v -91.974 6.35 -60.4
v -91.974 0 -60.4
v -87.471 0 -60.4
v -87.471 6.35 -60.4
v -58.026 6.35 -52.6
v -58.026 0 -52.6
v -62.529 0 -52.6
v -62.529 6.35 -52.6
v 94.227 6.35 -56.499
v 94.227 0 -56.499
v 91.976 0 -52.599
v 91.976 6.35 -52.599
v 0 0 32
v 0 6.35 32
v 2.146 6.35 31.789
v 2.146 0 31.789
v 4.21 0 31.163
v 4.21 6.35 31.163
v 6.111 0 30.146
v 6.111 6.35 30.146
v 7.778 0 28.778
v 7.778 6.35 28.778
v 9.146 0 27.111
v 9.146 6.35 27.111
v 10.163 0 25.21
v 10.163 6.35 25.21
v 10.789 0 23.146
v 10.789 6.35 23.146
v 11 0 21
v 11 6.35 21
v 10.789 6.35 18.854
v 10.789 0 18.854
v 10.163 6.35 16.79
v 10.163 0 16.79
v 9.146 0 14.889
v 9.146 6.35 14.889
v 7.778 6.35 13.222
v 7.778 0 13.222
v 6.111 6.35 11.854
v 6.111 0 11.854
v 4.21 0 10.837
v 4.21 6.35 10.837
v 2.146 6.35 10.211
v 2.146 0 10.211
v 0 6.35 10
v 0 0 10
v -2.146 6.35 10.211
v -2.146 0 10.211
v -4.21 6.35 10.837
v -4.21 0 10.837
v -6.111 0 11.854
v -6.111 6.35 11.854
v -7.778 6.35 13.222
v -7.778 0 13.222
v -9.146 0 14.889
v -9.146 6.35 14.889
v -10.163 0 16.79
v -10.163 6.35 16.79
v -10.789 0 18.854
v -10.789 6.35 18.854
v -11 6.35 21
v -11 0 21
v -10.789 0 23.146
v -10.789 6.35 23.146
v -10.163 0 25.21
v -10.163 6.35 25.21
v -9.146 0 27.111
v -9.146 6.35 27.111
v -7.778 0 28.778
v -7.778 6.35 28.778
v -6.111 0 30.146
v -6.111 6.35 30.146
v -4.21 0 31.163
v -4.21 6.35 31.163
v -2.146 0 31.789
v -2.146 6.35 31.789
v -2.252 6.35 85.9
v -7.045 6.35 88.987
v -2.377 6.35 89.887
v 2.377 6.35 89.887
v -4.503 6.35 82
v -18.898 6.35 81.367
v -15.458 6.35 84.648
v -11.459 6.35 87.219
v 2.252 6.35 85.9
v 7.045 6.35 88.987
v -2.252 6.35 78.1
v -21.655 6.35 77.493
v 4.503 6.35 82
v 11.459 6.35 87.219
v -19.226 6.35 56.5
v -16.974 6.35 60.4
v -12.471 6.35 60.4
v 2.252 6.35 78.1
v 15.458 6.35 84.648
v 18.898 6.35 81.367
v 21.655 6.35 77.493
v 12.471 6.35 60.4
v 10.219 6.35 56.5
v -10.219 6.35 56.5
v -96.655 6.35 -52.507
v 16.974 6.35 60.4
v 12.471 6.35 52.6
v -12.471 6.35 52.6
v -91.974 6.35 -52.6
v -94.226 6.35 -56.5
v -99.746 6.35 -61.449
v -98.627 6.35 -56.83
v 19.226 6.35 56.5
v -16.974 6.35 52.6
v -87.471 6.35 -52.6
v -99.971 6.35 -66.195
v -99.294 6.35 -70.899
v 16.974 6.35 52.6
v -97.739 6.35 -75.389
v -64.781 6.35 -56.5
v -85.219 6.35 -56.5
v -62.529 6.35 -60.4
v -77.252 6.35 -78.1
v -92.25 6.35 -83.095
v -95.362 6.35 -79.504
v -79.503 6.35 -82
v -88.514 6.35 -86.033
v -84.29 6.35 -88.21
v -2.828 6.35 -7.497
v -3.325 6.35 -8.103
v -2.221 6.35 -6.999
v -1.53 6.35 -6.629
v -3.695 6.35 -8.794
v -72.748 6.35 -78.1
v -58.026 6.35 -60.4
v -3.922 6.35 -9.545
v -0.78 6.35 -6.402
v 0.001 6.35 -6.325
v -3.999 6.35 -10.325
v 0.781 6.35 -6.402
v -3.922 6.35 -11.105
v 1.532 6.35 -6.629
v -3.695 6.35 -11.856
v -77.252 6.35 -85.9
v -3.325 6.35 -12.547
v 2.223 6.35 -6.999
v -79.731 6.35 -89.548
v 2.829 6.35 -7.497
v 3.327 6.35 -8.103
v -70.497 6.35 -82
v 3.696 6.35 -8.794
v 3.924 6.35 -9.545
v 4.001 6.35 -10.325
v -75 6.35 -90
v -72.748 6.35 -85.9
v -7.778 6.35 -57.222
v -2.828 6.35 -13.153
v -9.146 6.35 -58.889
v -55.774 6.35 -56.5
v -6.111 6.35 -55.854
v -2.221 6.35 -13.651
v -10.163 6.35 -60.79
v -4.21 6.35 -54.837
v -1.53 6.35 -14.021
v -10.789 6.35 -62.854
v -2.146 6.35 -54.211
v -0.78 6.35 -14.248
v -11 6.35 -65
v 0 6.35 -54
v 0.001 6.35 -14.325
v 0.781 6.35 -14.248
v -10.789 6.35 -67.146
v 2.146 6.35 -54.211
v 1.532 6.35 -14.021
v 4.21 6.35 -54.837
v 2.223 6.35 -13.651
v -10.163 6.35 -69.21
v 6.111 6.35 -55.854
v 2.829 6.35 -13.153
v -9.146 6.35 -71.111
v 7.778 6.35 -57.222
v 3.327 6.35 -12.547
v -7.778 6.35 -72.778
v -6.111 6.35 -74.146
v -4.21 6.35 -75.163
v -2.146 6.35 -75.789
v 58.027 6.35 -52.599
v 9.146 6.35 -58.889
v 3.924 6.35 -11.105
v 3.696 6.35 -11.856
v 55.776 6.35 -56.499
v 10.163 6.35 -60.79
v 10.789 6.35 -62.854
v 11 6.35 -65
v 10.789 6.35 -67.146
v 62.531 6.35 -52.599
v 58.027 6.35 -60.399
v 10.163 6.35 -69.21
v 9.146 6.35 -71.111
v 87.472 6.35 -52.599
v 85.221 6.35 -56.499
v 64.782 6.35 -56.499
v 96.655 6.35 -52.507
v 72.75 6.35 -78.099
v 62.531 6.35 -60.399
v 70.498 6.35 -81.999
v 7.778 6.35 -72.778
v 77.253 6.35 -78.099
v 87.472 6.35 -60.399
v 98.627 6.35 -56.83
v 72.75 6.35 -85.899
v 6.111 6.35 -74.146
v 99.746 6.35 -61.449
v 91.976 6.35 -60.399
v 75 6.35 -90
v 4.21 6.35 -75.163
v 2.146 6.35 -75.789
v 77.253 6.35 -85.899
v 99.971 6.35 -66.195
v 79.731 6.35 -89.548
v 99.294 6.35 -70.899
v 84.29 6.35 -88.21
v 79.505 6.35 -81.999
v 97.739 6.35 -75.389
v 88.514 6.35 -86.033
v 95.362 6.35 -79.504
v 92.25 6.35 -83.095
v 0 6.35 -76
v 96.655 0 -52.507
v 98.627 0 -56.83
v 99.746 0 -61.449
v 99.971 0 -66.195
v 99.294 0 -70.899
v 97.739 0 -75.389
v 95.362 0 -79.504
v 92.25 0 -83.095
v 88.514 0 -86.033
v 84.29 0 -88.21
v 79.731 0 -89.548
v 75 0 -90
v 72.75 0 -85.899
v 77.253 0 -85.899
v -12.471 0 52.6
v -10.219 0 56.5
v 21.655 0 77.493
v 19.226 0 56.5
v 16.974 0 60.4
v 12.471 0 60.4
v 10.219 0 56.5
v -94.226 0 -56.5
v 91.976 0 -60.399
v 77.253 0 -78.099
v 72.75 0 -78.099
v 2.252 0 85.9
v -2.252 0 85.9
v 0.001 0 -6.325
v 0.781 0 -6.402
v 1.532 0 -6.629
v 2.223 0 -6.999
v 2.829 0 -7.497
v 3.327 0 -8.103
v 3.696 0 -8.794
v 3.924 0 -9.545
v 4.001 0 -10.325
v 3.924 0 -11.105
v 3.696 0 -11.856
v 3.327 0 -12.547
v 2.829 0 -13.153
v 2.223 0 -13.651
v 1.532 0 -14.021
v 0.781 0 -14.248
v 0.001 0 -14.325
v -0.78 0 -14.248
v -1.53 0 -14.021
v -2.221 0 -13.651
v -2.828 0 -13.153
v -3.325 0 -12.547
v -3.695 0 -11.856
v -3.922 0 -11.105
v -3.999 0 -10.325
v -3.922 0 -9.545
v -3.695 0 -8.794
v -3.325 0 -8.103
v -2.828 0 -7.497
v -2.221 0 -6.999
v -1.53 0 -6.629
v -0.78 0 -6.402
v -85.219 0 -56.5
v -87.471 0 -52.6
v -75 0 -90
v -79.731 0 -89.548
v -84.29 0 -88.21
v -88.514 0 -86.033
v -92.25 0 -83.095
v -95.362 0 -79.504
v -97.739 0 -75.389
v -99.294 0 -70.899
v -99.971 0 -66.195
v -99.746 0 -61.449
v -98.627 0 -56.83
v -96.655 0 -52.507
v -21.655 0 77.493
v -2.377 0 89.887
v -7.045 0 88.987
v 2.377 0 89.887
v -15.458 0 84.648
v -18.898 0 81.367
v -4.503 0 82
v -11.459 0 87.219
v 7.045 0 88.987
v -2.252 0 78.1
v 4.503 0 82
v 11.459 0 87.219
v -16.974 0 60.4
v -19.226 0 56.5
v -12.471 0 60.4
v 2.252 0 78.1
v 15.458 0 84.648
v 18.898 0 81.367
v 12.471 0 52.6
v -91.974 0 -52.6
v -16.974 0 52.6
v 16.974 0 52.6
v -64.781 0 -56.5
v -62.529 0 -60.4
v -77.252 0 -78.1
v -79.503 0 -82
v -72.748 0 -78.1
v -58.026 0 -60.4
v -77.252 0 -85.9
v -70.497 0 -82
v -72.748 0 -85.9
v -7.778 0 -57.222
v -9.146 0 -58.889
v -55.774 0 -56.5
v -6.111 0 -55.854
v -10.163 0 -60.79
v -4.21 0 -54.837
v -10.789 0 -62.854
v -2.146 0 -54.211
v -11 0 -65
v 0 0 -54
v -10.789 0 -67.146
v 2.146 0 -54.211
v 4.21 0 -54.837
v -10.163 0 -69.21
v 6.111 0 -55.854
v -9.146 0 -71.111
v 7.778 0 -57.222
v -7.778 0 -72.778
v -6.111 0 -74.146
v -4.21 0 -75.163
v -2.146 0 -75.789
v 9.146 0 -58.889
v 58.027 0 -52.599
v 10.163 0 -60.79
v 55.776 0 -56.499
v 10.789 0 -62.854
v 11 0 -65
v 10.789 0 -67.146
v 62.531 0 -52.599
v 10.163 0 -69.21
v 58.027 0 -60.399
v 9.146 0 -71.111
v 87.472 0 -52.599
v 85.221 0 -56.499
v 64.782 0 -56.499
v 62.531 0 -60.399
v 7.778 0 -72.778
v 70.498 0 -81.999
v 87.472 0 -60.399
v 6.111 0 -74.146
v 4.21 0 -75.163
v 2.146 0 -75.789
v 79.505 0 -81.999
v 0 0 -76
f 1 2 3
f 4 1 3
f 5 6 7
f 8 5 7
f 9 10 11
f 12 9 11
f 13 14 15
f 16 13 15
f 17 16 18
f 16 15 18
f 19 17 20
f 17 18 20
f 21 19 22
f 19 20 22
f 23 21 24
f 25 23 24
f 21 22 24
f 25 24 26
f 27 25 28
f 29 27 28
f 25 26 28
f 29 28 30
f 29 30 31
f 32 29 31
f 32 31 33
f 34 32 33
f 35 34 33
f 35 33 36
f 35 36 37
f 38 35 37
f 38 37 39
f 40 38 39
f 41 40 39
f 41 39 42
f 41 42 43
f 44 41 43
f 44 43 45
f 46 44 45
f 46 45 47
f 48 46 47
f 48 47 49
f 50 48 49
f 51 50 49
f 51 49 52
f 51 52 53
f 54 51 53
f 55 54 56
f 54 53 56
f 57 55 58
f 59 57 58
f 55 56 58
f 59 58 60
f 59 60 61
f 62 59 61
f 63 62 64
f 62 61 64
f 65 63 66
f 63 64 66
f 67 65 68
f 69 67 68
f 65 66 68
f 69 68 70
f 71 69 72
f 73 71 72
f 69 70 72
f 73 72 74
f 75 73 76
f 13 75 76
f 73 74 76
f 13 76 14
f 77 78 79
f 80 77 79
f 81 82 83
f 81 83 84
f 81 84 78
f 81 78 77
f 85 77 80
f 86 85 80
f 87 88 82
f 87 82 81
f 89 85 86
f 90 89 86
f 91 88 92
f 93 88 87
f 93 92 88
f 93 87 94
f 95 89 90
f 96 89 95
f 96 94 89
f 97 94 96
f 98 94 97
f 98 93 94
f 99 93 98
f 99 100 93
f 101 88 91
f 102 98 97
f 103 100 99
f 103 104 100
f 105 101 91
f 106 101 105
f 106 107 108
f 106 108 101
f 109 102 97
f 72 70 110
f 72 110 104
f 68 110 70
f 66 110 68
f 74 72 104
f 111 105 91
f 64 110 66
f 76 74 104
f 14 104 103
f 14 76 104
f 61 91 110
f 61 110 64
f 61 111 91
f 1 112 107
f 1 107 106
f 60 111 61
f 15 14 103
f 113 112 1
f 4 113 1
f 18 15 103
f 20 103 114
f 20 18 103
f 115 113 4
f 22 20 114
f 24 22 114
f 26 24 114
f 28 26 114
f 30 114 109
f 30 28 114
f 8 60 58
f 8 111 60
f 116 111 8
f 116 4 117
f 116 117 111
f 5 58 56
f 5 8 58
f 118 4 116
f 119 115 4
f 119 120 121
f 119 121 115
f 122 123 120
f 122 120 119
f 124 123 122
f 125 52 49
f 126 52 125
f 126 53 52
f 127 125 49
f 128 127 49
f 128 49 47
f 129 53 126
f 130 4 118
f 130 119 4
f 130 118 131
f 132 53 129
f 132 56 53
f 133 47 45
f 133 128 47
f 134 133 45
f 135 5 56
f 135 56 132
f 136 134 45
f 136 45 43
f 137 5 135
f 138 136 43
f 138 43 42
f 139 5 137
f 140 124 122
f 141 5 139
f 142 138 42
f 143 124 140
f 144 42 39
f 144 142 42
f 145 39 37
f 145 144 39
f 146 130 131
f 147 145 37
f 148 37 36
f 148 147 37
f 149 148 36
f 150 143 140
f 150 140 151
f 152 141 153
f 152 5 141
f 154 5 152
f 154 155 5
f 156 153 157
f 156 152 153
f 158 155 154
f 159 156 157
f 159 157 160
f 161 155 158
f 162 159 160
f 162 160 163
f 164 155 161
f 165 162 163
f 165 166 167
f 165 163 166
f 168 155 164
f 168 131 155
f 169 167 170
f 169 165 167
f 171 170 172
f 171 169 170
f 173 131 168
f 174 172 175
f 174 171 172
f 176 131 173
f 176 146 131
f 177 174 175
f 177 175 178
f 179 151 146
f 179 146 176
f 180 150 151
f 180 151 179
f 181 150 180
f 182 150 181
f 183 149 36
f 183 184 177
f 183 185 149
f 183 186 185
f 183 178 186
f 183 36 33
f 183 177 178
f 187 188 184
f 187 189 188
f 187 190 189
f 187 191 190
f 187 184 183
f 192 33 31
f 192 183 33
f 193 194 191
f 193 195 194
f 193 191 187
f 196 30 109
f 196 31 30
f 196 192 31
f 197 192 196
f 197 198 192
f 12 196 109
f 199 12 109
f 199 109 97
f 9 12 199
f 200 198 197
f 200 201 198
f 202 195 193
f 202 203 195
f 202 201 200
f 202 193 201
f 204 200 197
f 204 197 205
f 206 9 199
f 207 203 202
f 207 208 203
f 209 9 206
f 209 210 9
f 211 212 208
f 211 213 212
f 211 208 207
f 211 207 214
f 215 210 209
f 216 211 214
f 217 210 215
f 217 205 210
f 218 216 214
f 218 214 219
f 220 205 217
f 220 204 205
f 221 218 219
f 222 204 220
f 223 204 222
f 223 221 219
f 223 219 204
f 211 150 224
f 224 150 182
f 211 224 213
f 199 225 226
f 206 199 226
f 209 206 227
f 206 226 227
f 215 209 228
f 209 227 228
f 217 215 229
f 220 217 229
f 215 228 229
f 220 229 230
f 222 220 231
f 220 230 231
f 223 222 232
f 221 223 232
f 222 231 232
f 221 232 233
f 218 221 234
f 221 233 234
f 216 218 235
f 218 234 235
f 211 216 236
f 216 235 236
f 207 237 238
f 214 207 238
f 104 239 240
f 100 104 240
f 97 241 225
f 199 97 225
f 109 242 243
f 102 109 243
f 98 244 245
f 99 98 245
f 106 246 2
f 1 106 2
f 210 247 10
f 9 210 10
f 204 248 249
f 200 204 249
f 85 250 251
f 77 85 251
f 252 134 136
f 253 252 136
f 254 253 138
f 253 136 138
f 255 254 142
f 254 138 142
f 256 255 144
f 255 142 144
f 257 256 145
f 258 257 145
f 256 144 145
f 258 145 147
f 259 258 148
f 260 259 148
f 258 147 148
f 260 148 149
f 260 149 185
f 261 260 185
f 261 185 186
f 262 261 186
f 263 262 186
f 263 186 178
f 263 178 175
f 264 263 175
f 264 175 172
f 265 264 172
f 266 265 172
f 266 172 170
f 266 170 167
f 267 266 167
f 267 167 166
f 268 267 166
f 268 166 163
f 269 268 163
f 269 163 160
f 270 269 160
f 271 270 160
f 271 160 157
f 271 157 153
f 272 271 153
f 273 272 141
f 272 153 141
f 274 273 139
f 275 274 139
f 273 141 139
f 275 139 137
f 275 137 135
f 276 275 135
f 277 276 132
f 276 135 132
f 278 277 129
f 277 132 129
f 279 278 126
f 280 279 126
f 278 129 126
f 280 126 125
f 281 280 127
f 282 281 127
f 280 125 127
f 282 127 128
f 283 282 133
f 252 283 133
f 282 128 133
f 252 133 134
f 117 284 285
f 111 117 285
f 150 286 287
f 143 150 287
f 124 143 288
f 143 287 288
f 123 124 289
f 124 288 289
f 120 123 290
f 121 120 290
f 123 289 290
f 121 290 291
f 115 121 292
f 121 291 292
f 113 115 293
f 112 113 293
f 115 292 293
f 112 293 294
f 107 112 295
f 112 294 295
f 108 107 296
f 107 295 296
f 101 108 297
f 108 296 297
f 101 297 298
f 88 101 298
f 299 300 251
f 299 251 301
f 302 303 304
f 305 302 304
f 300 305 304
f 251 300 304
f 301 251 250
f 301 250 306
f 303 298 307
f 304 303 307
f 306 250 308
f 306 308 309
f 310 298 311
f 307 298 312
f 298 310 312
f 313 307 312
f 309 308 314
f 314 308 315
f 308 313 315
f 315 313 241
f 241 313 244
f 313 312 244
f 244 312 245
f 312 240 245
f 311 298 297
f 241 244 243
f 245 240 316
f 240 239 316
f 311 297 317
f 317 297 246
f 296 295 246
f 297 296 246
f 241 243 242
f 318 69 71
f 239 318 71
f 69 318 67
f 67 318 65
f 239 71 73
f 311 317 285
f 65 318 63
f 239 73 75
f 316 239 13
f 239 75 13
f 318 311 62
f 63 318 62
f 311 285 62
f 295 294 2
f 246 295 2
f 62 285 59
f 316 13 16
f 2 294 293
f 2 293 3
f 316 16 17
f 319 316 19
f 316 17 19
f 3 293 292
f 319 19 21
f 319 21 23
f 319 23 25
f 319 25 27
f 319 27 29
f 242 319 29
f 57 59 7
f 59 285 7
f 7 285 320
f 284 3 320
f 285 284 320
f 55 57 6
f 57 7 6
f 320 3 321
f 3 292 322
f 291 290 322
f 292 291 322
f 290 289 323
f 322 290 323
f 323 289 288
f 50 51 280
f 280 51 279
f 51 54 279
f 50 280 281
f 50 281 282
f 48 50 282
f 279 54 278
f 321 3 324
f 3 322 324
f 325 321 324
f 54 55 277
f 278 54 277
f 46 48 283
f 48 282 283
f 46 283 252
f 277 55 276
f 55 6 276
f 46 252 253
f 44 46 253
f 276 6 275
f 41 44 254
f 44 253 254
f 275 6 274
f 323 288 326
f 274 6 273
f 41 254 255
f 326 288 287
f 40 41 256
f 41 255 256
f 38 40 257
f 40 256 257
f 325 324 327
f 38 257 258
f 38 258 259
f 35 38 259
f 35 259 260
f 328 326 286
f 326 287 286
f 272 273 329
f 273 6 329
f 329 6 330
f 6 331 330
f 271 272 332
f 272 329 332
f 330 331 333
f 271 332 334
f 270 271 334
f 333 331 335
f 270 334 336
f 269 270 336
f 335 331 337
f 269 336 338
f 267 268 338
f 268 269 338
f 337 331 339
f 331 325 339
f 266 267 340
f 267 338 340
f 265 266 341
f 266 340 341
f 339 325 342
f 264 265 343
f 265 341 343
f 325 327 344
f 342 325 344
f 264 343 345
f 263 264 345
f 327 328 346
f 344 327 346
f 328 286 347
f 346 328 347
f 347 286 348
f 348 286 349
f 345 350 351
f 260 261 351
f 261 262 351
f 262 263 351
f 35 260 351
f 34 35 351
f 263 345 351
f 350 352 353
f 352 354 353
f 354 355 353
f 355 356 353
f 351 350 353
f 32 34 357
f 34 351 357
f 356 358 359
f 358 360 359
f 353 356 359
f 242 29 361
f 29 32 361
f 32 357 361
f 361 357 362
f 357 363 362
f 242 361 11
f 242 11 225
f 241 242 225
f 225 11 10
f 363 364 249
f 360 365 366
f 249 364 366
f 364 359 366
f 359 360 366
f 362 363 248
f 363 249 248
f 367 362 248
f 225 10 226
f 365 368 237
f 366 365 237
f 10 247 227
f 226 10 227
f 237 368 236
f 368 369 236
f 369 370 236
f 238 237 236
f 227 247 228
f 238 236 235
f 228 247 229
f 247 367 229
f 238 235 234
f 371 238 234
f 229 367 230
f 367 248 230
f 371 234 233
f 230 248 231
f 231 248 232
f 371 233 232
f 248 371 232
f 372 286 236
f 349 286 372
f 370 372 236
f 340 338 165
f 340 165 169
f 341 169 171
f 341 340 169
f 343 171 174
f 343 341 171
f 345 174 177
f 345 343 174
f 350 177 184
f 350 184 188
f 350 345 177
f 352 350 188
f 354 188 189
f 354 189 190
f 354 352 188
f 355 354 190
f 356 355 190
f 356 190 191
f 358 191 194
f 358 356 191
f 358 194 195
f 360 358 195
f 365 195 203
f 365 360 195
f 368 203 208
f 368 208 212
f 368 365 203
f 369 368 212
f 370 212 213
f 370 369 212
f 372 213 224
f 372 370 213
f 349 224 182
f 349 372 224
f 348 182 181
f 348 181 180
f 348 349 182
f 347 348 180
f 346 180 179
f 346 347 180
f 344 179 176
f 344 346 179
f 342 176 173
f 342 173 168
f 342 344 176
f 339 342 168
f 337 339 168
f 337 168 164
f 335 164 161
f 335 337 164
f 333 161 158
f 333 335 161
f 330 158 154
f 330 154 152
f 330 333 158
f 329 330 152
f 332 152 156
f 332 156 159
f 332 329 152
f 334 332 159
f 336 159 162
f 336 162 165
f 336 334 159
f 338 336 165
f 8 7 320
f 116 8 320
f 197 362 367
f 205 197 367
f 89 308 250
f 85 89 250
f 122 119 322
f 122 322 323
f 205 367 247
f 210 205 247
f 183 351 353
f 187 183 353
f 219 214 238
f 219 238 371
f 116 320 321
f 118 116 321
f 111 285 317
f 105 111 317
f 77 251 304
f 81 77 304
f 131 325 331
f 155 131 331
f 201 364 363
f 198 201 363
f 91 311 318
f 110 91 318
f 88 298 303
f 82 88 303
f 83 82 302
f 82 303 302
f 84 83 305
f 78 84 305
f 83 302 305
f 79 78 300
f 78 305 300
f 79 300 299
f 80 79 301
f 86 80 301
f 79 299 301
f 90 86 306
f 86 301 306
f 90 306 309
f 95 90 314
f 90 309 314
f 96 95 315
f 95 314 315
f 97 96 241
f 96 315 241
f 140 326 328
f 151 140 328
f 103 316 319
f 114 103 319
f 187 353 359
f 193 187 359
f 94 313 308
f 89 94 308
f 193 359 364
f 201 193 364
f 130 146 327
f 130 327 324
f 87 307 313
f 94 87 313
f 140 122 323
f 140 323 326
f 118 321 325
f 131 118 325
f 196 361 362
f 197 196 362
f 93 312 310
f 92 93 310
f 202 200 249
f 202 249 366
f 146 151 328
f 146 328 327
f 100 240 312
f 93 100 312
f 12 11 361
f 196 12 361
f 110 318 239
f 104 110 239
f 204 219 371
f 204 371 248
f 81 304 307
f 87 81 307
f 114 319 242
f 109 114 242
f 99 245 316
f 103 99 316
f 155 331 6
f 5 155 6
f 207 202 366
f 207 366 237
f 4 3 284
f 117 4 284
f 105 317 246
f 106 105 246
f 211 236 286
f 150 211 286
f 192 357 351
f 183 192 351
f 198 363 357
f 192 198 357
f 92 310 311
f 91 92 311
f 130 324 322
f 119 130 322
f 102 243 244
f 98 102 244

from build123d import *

# Parameters (mm, degrees)
ESQUISSE1_R             = 11
BOSS_EXTRU_1_DEPTH      = 6.35
ENL_V_MAT_EXTRU_1_DEPTH = 135.686014493
ESQUISSE4_R             = 4
ENL_V_MAT_EXTRU_2_DEPTH = 135.686014493
ESQUISSE5_R             = 11
ENL_V_MAT_EXTRU_3_DEPTH = 135.686014493


with BuildPart() as part:
    # Esquisse1 → Boss.-Extru.1 (new body)
    with BuildSketch(Plane(origin=(0, 0, 0), x_dir=(1, 0, 0), z_dir=(0, 1, 0))):
        with BuildLine():
            Line((-96.654639651, 52.506938663), (-21.654639651, -77.493061337))
            ThreePointArc((-21.654639651, -77.493061337), (0, -90), (21.654639651, -77.493061337))
            Line((21.654639651, -77.493061337), (96.654639651, 52.506938663))
            ThreePointArc((96.654639651, 52.506938663), (96.648631983, 77.50346885), (75, 90))
            Line((75, 90), (-75, 90))
            ThreePointArc((-75, 90), (-96.648631983, 77.50346885), (-96.654639651, 52.506938663))
        make_face()
        with Locations(Location((0, 65, 0), (0, 0, 270))):
            Circle(ESQUISSE1_R, mode=Mode.SUBTRACT)
    extrude(amount=BOSS_EXTRU_1_DEPTH)

    # Esquisse3 → Enlèv. mat.-Extru.1 (cut, through all)
    with BuildSketch(Plane.XZ):
        Polygon((-79.5033321, -82), (-77.25166605, -85.9), (-72.74833395, -85.9), (-70.4966679, -82), (-72.74833395, -78.1), (-77.25166605, -78.1), align=None)
        Polygon((-94.225763964, -56.5), (-91.974097914, -60.4), (-87.470765814, -60.4), (-85.219099765, -56.5), (-87.470765814, -52.6), (-91.974097914, -52.6), align=None)
        Polygon((-64.780900235, -56.5), (-62.529234186, -60.4), (-58.025902086, -60.4), (-55.774236036, -56.5), (-58.025902086, -52.6), (-62.529234186, -52.6), align=None)
        Polygon((55.775701891, -56.499154304), (58.02736794, -60.399154304), (62.53070004, -60.399154304), (64.78236609, -56.499154304), (62.53070004, -52.599154304), (58.02736794, -52.599154304), align=None)
        Polygon((70.498133755, -81.999154304), (72.749799805, -85.899154304), (77.253131904, -85.899154304), (79.504797954, -81.999154304), (77.253131904, -78.099154304), (72.749799805, -78.099154304), align=None)
        Polygon((85.220565619, -56.499154304), (87.472231669, -60.399154304), (91.975563769, -60.399154304), (94.227229819, -56.499154304), (91.975563769, -52.599154304), (87.472231669, -52.599154304), align=None)
        Polygon((-4.5033321, 82), (-2.25166605, 78.1), (2.25166605, 78.1), (4.5033321, 82), (2.25166605, 85.9), (-2.25166605, 85.9), align=None)
        Polygon((10.219099765, 56.5), (12.470765814, 52.6), (16.974097914, 52.6), (19.225763964, 56.5), (16.974097914, 60.4), (12.470765814, 60.4), align=None)
        Polygon((-19.225763964, 56.5), (-16.974097914, 52.6), (-12.470765814, 52.6), (-10.219099765, 56.5), (-12.470765814, 60.4), (-16.974097914, 60.4), align=None)
    extrude(amount=-ENL_V_MAT_EXTRU_1_DEPTH, mode=Mode.SUBTRACT)

    # Esquisse4 → Enlèv. mat.-Extru.2 (cut, through all)
    with BuildSketch(Plane(origin=(0, 6.35, 0), x_dir=(1, 0, 0), z_dir=(0, 1, 0))):
        with Locations(Location((0.000849353, 10.324999995, 0), (0, 0, 270))):
            Circle(ESQUISSE4_R)
    extrude(amount=-ENL_V_MAT_EXTRU_2_DEPTH, mode=Mode.SUBTRACT)

    # Esquisse5 → Enlèv. mat.-Extru.3 (cut, through all)
    with BuildSketch(Plane(origin=(0, 6.35, 0), x_dir=(1, 0, 0), z_dir=(0, 1, 0))):
        with Locations(Location((0, -21, 0), (0, 0, 270))):
            Circle(ESQUISSE5_R)
    extrude(amount=-ENL_V_MAT_EXTRU_3_DEPTH, mode=Mode.SUBTRACT)


solid = part.part
